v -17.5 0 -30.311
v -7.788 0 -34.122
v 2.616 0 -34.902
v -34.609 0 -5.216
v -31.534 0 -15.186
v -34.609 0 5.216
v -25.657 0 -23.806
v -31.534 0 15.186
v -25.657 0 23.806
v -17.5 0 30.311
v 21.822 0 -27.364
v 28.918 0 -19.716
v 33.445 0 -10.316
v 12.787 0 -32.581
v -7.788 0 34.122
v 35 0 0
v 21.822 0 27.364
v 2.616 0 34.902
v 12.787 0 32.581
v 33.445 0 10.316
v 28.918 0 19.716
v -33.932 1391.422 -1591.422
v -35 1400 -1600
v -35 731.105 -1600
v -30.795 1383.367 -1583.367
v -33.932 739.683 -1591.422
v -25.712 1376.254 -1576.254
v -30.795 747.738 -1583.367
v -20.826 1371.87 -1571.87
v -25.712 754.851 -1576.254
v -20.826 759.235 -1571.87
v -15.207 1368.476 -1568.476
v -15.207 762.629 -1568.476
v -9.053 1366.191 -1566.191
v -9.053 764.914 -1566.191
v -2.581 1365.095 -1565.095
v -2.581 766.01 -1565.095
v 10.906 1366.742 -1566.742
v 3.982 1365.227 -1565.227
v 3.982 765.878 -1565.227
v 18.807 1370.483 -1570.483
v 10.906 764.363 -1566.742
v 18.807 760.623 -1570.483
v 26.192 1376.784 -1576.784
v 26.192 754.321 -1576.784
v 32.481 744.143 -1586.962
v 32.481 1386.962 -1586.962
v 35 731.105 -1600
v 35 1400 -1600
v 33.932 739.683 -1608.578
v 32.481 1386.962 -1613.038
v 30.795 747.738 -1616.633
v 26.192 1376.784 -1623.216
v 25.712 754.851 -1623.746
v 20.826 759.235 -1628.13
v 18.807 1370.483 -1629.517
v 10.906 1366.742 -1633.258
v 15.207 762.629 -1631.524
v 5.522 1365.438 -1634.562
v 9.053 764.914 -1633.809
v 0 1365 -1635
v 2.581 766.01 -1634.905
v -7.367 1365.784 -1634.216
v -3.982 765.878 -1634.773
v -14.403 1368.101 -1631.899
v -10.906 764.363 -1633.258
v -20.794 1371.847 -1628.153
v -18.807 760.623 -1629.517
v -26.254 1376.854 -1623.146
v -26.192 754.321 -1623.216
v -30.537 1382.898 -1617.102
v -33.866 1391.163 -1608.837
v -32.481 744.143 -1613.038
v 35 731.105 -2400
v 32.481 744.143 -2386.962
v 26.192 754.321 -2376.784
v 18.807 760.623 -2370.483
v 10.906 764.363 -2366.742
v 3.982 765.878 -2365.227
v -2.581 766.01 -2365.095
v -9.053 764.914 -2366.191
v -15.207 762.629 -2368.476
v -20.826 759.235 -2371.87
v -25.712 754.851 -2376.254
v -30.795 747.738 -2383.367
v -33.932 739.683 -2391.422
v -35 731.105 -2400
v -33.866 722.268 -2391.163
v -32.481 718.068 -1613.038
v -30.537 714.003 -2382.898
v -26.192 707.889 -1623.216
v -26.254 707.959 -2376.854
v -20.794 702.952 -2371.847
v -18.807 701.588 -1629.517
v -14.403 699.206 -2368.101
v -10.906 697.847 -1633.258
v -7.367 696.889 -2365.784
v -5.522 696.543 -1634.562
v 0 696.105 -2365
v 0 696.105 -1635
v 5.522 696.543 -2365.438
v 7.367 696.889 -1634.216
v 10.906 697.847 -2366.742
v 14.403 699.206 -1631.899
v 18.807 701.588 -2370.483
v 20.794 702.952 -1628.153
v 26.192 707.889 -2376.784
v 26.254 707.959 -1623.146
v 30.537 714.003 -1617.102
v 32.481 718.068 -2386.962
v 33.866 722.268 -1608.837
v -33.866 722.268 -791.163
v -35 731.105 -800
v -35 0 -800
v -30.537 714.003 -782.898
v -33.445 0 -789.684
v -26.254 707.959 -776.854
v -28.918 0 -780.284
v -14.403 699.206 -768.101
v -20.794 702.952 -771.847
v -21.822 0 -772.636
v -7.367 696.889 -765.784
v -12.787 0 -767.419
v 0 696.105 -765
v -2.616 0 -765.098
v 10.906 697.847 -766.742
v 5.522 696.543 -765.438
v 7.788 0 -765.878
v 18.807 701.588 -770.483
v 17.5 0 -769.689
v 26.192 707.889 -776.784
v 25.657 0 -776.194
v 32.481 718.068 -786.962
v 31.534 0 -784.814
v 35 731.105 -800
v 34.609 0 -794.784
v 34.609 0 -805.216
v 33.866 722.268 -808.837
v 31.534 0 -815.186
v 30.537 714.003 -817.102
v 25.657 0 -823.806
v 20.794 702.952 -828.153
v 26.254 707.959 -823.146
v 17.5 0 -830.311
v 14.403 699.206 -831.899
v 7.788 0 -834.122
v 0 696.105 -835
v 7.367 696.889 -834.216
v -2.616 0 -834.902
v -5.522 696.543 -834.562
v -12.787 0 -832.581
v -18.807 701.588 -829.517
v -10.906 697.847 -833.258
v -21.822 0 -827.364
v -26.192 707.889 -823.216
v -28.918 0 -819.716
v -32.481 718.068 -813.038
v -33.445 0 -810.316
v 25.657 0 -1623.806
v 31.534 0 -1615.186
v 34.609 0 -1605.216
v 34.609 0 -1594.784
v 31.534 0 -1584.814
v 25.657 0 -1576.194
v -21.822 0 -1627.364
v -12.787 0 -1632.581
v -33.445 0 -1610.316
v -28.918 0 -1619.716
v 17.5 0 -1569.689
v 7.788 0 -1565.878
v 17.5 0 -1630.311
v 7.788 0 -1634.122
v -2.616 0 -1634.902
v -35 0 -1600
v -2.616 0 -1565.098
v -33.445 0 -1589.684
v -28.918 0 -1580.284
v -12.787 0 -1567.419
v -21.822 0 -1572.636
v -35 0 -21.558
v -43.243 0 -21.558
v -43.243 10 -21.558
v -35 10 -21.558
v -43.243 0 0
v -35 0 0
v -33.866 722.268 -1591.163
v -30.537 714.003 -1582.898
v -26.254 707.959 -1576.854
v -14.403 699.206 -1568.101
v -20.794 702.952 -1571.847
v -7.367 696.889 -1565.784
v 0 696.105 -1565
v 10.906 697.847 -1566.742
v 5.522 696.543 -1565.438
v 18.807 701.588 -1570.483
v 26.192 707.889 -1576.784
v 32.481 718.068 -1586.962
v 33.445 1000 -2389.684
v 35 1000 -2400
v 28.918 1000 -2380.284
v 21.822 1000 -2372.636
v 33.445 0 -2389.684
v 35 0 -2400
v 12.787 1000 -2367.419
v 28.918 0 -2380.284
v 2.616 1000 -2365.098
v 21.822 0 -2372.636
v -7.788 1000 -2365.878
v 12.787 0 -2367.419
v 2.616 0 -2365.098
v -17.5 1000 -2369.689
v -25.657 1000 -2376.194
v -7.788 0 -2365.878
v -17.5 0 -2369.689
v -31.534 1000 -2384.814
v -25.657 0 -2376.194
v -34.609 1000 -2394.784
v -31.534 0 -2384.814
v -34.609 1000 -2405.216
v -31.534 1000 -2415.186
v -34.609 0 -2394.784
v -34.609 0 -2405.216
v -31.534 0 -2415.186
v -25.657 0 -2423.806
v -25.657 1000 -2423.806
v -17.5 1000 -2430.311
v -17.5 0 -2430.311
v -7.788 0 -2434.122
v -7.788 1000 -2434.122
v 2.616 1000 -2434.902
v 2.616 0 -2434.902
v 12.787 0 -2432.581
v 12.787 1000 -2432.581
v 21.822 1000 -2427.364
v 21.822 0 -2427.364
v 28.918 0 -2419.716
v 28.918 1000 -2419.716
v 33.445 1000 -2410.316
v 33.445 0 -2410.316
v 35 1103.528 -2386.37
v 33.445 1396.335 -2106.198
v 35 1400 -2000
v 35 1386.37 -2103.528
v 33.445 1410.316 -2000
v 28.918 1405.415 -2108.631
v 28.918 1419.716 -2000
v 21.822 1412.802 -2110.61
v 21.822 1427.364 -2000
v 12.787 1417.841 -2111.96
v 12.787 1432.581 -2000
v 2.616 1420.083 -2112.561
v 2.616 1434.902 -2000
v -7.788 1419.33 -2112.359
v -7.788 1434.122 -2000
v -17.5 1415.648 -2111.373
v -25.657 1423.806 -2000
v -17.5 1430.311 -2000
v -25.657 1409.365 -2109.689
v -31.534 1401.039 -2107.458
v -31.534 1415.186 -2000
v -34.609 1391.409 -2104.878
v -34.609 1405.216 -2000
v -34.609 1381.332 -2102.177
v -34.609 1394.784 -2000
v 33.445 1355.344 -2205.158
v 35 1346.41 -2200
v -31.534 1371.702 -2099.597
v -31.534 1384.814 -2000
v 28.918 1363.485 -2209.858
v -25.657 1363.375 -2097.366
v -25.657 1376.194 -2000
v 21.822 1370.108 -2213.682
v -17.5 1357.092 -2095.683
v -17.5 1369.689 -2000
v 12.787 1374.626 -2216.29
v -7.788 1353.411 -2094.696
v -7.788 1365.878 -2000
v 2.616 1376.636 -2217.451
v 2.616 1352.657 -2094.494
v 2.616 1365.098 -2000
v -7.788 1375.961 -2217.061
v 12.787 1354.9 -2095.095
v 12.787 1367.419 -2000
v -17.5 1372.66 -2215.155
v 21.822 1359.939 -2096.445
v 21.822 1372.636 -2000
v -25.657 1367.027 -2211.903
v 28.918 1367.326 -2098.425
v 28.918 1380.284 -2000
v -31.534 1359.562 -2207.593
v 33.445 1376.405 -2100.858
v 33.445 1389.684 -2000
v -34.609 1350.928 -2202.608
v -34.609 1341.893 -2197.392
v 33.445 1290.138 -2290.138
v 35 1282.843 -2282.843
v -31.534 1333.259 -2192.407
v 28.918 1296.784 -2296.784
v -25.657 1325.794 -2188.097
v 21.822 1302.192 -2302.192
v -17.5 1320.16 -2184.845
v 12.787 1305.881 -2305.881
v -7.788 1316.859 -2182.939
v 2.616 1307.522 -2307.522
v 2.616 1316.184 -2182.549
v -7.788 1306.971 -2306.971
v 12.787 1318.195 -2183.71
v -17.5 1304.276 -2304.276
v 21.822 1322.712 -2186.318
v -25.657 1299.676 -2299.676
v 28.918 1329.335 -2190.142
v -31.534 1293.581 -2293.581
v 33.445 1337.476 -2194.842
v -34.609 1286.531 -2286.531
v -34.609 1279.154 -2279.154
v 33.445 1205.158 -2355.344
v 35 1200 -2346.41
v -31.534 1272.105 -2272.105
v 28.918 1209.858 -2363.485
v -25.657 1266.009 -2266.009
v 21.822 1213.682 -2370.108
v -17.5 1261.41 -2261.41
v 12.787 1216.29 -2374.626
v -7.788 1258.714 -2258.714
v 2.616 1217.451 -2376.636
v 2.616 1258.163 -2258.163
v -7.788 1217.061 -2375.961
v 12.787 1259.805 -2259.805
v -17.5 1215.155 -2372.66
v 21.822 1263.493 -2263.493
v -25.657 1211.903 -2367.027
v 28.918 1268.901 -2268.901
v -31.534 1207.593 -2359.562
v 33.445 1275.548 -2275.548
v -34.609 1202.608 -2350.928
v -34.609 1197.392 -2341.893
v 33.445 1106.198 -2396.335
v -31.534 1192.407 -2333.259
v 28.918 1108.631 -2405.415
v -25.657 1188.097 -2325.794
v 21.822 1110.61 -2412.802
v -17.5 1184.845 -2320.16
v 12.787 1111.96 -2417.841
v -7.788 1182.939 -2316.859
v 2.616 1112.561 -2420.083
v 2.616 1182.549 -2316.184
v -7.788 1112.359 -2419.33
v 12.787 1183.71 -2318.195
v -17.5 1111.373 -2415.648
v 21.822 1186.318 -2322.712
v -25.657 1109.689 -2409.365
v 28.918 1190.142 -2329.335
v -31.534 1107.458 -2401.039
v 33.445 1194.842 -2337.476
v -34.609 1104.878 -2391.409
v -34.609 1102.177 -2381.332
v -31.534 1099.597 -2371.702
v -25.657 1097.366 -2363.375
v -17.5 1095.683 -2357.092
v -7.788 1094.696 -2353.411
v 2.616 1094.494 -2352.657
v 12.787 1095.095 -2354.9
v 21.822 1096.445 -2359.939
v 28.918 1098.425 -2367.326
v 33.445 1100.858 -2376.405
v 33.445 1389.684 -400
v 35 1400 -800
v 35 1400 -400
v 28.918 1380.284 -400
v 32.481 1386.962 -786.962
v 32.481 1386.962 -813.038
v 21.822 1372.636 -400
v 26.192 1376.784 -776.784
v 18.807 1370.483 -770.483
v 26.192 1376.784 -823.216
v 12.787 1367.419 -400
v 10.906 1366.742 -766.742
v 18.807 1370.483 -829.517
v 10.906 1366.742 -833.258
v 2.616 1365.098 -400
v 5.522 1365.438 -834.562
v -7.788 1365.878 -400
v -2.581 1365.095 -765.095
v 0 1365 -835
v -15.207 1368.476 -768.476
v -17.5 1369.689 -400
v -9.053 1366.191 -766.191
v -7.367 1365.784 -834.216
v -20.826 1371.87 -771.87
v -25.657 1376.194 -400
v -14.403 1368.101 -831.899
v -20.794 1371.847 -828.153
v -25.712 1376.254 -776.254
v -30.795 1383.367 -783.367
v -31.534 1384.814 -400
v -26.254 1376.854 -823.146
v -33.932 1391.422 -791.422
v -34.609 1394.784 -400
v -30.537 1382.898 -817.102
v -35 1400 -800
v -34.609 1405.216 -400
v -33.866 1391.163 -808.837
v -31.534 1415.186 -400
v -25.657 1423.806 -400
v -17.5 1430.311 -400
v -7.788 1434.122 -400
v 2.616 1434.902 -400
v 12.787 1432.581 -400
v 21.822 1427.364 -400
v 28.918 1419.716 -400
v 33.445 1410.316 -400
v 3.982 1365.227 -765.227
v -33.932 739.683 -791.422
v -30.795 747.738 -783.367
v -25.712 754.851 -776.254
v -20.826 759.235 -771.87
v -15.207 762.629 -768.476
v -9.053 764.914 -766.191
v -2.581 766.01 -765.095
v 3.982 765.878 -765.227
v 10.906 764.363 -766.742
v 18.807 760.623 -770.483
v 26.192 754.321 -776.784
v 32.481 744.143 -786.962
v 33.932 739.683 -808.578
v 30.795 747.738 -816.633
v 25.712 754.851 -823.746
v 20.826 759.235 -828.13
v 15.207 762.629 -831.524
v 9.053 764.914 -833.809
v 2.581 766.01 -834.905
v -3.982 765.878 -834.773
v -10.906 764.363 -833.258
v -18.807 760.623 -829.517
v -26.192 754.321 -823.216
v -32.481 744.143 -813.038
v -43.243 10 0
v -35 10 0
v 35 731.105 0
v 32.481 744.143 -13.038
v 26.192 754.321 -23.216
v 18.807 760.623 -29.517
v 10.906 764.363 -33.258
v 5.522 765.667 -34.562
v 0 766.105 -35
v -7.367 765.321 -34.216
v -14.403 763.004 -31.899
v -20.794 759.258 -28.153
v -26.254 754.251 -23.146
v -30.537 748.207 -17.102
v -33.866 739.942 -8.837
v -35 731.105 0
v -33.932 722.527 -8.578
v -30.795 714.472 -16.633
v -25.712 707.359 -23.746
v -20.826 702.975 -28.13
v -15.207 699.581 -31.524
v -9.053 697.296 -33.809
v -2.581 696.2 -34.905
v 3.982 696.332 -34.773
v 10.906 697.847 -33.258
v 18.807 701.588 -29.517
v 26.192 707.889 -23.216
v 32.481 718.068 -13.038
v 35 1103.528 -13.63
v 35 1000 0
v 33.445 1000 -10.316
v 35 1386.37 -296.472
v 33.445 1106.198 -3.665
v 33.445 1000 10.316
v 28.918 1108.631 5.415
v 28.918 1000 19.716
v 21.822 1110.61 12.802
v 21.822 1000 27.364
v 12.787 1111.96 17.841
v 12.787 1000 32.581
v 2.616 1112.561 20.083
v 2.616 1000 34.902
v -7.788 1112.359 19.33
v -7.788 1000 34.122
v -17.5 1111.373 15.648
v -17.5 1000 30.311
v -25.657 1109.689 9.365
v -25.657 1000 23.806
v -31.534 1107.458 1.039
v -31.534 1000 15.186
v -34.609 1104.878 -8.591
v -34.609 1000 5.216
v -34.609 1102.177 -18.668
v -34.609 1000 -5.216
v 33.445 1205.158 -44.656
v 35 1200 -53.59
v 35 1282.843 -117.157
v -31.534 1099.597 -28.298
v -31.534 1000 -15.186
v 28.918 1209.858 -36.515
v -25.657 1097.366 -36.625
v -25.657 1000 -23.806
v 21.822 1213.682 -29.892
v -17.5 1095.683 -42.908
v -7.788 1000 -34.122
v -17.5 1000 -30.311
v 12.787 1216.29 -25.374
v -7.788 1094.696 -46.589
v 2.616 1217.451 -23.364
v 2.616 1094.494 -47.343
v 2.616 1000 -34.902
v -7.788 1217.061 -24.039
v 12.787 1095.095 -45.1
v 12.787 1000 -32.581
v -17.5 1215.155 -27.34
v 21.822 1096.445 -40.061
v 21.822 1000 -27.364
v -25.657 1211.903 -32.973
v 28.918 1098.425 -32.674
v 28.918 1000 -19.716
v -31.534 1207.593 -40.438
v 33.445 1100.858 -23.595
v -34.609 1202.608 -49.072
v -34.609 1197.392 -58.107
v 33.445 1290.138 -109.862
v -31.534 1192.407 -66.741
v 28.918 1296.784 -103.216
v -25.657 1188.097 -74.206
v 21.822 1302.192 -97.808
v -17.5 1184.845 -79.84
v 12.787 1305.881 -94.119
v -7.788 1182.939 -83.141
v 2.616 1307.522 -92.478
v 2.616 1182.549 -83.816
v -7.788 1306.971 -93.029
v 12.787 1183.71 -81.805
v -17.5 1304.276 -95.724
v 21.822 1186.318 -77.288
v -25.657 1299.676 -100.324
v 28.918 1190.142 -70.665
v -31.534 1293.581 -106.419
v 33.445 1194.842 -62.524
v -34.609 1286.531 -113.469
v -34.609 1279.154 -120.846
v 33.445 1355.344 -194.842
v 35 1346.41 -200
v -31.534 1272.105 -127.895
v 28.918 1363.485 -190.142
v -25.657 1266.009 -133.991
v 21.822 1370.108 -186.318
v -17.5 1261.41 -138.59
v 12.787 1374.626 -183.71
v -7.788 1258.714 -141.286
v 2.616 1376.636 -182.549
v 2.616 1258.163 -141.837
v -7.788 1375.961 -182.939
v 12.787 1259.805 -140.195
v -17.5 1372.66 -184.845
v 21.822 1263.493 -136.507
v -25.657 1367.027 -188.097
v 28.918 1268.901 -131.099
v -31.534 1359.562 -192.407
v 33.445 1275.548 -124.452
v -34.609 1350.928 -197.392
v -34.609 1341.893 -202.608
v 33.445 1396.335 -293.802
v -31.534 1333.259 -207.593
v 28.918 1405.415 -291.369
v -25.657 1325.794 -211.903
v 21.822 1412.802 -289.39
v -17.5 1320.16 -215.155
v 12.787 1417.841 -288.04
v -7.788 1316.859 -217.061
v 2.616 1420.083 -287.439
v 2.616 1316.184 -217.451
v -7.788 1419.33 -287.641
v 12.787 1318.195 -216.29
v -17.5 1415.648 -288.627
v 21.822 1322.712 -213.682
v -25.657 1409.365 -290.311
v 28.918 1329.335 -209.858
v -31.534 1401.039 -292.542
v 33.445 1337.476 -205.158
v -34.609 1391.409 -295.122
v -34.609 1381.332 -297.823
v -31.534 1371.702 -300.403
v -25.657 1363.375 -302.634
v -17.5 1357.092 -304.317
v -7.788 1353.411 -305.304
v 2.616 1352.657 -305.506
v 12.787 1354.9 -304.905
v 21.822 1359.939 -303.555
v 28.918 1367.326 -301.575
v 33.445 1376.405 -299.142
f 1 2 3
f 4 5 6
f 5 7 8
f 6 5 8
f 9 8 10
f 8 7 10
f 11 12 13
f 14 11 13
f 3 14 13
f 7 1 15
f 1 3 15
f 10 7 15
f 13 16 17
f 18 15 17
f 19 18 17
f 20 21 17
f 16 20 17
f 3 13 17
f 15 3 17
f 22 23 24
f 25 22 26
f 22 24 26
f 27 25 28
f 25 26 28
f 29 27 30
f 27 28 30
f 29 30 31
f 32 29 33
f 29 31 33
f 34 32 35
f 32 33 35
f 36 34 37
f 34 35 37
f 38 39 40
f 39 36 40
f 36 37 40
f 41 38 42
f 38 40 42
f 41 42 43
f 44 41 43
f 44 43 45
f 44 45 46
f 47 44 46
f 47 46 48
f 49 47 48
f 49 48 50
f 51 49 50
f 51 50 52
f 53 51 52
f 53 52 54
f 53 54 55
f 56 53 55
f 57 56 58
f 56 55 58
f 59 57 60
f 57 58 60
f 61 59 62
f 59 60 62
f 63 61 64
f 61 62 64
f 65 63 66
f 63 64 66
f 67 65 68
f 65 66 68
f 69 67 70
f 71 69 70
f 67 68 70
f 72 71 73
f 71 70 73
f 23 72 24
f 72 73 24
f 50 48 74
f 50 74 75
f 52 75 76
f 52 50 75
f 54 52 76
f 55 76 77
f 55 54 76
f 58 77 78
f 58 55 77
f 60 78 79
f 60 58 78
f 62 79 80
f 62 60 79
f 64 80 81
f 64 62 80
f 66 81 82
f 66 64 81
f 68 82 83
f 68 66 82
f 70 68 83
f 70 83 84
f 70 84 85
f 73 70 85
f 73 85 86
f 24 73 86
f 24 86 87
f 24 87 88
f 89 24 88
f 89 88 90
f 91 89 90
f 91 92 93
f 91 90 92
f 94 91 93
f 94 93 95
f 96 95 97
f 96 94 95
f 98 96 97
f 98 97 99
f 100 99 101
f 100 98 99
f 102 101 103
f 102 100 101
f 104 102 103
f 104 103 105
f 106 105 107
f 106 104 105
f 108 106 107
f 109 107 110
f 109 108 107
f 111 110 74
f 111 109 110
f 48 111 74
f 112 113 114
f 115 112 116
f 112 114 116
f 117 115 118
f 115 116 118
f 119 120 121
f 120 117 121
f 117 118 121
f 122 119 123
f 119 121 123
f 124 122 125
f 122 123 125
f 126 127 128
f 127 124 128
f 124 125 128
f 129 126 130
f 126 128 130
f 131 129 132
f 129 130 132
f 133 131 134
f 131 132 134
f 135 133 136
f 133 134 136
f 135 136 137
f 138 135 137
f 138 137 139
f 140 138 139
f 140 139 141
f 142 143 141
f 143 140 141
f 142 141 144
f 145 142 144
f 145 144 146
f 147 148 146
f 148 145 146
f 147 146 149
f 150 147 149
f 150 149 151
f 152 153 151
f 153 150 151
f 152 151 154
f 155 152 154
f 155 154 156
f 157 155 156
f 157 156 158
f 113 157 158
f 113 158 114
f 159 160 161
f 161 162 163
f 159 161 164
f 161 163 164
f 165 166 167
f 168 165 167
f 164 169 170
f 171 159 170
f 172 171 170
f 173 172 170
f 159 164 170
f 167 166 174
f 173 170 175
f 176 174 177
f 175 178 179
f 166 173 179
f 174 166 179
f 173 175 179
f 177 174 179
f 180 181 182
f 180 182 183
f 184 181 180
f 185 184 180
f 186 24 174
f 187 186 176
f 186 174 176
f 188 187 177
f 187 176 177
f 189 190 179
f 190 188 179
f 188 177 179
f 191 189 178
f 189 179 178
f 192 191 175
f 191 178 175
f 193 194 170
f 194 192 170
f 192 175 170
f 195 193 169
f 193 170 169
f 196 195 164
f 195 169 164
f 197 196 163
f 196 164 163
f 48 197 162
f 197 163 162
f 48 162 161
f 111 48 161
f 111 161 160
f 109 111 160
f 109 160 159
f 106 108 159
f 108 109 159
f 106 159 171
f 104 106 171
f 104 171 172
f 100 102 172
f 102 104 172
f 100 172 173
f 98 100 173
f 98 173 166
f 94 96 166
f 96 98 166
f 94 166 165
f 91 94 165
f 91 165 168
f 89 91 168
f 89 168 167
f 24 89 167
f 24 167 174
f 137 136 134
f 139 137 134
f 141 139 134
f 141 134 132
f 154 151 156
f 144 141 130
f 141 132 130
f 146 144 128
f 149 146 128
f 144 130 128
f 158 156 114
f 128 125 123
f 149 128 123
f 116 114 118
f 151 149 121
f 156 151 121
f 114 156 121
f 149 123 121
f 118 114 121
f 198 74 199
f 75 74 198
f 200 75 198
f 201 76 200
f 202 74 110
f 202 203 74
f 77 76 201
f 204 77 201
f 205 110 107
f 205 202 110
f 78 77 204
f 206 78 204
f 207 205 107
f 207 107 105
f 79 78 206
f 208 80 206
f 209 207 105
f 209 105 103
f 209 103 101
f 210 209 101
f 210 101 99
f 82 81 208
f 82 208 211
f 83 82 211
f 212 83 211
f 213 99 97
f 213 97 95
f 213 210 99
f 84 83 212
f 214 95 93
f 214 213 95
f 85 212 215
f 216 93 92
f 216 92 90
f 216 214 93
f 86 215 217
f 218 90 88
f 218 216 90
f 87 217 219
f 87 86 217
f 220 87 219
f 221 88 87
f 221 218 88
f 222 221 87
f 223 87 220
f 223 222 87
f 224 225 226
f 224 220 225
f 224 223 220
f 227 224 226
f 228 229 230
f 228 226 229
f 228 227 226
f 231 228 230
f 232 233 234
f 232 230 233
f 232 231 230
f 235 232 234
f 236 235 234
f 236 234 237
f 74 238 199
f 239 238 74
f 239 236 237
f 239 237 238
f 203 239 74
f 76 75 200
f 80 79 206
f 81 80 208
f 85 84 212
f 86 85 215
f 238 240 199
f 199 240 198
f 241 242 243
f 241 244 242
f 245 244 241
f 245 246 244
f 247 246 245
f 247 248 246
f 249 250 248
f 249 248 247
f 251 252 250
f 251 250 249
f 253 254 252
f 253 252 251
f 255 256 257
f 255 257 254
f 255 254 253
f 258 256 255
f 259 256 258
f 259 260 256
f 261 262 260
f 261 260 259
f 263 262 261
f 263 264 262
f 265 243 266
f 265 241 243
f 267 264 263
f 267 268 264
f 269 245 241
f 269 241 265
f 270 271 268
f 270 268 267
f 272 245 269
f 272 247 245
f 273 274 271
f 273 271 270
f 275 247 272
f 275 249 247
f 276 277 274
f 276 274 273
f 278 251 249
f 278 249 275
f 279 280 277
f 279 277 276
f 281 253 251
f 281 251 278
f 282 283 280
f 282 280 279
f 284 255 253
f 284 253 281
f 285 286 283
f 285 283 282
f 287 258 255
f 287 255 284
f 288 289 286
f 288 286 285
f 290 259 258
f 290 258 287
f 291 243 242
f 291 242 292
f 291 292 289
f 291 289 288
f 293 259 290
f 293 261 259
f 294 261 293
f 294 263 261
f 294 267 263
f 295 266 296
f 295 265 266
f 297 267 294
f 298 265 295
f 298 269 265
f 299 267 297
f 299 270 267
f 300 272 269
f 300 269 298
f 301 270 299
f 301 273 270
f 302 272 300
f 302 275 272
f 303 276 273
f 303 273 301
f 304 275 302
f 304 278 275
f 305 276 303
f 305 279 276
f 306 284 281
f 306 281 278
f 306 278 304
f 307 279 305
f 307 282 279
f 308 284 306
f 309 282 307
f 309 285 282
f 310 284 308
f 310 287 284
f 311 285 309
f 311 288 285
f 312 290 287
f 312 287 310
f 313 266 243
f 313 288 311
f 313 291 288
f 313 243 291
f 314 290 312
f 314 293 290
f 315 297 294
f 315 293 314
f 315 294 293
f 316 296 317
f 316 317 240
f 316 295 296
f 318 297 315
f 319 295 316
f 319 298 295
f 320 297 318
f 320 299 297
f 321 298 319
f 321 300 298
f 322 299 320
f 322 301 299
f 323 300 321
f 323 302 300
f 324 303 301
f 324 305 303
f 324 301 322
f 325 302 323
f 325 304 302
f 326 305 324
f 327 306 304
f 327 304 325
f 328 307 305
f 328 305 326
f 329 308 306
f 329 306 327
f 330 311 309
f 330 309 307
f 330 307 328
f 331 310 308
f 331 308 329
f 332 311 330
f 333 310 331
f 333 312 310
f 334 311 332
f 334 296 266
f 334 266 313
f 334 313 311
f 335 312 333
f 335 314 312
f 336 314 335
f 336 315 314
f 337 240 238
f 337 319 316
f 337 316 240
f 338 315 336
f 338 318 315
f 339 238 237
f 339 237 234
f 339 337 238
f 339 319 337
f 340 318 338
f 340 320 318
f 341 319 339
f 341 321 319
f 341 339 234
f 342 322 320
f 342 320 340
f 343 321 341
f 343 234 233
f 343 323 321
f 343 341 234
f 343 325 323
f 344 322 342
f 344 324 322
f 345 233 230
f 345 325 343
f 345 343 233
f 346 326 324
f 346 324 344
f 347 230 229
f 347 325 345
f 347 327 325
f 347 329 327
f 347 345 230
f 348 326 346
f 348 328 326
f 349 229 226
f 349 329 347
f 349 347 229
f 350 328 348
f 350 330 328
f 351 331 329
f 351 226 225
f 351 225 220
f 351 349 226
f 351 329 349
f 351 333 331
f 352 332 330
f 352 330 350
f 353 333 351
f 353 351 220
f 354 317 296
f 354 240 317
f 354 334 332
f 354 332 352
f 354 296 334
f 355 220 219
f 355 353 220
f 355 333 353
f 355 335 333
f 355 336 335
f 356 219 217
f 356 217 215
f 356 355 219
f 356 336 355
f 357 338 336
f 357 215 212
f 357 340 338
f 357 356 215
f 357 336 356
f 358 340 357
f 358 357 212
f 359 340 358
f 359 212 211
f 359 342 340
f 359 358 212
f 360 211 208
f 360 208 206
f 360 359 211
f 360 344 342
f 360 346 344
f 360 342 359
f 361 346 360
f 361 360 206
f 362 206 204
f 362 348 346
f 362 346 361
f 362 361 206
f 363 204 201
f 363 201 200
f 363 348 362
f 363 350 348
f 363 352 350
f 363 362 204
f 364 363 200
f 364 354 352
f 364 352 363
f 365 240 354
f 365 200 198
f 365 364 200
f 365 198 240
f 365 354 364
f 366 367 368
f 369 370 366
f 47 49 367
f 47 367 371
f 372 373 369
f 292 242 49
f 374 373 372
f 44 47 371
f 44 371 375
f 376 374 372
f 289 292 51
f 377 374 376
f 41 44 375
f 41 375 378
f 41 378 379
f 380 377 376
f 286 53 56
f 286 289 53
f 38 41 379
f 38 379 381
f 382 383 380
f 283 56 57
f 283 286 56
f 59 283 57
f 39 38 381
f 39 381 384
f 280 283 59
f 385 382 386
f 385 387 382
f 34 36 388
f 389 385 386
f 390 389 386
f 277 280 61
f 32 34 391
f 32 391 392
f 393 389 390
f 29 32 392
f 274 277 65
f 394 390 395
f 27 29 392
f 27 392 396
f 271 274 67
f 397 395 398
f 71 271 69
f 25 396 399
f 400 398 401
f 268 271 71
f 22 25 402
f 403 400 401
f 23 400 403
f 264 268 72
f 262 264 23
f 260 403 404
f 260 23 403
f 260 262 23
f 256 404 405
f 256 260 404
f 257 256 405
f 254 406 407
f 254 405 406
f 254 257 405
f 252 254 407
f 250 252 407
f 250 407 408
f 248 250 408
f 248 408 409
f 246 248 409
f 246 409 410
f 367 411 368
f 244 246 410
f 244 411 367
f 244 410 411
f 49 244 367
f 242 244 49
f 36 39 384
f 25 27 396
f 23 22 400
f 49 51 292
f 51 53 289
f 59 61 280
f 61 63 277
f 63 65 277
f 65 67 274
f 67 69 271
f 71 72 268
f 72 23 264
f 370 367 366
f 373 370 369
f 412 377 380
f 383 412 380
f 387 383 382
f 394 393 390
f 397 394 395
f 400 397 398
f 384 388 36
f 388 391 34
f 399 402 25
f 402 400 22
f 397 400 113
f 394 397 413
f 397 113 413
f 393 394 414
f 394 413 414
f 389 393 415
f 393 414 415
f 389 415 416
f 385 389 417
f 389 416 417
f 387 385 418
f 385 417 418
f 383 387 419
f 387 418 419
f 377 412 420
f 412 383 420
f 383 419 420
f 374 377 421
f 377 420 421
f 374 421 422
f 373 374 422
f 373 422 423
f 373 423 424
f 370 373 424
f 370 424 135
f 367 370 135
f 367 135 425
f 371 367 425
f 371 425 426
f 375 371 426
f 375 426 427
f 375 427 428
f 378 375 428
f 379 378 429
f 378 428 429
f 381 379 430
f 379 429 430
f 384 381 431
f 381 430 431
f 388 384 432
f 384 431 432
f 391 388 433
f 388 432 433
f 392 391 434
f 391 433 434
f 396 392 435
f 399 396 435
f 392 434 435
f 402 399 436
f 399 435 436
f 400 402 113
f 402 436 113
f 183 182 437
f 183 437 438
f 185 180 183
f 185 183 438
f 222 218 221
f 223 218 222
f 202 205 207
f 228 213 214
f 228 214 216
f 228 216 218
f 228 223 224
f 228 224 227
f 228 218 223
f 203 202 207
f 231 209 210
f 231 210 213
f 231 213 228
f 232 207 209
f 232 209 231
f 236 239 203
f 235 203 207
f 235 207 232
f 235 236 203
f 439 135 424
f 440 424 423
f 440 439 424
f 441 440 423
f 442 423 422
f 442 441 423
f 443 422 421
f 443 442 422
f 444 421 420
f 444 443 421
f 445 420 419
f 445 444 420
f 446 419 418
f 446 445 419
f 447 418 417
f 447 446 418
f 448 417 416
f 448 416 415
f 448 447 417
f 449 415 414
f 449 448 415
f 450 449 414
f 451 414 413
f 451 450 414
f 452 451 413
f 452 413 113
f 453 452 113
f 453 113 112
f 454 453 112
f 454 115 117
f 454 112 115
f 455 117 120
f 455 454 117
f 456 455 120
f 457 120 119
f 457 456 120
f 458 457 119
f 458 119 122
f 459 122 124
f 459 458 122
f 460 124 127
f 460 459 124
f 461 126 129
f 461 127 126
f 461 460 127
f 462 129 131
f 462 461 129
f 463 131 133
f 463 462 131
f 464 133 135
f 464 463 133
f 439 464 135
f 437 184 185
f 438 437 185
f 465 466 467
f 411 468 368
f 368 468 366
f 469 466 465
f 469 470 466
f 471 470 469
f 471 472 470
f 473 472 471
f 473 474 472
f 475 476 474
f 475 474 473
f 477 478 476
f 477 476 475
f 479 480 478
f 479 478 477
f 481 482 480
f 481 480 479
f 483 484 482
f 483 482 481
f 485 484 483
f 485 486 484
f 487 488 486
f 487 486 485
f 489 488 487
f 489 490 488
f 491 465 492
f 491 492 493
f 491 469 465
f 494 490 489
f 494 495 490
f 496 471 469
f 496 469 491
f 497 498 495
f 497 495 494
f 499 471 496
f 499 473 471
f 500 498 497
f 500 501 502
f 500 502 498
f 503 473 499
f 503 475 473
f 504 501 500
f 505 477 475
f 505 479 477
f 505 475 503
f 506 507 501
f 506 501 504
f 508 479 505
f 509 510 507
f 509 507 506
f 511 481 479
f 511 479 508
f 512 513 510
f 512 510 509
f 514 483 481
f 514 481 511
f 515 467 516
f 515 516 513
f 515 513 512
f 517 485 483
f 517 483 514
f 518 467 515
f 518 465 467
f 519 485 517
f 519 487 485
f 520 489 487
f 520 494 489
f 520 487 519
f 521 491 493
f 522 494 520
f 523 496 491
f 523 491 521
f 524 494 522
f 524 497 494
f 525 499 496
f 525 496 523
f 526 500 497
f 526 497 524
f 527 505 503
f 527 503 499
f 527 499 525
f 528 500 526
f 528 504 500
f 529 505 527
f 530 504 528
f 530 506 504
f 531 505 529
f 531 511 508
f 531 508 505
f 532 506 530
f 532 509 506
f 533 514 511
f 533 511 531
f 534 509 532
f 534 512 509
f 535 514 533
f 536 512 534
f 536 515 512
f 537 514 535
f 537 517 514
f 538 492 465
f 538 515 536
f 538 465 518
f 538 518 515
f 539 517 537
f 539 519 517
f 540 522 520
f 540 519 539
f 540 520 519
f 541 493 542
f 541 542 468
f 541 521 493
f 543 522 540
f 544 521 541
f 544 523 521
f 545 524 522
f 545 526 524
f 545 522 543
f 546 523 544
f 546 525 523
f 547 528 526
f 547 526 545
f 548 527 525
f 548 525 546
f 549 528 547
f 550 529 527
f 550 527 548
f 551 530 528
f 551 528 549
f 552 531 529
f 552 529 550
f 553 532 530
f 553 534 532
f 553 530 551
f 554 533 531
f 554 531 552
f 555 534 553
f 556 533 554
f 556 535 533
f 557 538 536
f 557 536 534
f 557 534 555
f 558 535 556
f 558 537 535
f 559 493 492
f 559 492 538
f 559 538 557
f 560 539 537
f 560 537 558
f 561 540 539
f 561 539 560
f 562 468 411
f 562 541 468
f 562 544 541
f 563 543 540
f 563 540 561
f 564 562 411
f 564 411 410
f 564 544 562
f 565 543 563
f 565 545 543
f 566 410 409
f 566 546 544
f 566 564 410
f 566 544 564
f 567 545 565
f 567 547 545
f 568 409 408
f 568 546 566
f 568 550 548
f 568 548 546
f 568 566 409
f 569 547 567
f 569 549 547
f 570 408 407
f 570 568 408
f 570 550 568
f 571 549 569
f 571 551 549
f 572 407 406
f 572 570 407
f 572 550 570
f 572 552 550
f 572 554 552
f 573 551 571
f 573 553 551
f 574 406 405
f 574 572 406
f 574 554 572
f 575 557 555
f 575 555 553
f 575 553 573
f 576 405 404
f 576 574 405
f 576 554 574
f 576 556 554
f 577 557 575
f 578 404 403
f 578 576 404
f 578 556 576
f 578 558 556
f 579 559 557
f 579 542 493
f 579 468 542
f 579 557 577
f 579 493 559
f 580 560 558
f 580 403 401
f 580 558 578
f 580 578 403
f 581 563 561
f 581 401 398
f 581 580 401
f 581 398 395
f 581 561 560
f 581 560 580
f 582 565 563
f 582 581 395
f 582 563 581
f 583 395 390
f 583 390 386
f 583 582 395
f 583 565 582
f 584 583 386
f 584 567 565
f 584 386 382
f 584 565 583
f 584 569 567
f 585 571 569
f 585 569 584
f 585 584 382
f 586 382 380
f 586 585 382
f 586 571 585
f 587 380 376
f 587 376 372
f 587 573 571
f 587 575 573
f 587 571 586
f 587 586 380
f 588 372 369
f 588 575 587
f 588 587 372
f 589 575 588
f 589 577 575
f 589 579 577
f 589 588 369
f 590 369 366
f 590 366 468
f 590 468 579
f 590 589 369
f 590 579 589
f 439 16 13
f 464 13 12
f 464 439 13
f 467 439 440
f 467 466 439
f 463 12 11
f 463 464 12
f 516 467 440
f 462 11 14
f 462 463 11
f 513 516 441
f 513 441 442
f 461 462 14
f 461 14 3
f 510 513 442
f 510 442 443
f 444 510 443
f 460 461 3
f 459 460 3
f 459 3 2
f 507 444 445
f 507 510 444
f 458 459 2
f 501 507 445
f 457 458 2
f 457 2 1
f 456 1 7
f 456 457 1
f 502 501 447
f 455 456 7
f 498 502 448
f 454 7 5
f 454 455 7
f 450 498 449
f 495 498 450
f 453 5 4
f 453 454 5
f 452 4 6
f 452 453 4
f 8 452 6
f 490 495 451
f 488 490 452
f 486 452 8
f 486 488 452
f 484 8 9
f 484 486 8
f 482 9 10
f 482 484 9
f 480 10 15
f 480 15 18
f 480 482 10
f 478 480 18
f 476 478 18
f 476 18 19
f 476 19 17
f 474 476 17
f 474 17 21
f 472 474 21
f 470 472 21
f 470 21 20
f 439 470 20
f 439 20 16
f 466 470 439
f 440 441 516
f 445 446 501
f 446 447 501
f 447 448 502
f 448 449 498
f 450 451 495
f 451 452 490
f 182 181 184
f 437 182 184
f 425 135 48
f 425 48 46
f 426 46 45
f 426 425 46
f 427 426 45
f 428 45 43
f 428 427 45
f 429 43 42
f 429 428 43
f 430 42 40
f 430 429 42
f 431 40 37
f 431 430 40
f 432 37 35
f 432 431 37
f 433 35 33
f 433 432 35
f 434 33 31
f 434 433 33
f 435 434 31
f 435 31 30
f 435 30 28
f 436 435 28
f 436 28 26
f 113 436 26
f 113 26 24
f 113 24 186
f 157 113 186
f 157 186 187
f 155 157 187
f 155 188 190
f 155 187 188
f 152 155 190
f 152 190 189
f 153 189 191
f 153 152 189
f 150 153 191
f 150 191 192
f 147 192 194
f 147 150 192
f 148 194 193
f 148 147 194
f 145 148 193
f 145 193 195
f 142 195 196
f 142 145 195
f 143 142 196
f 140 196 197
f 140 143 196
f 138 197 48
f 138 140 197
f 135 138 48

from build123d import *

# Parameters (mm, degrees)
SKETCH_2_R      = 35
SKETCH_3_R      = 35
EXTRUDE_1_DEPTH = 1400
SKETCH_4_R      = 35
EXTRUDE_2_DEPTH = 2400
SKETCH_5_W      = 8.243400837
SKETCH_5_H      = 21.558129969
EXTRUDE_3_DEPTH = 10


with BuildPart() as part:
    # 扫描1: sweep along a path in 草图1
    with BuildLine(Plane(origin=(0, 0, 0), x_dir=(0, 0, -1), z_dir=(1, 0, 0))) as sweep_1_path:
        Line((0, 0), (0, 1000))
        ThreePointArc((0, 1000), (117.157287525, 1282.842712475), (400, 1400))
        Line((400, 1400), (2000, 1400))
        ThreePointArc((2000, 1400), (2282.842712475, 1282.842712475), (2400, 1000))
        Line((2400, 1000), (2400, 0))
    # 草图2 → 扫描1 (sweep)
    with BuildSketch(Plane(origin=(0, 0, 0), x_dir=(1, 0, 0), z_dir=(0, 1, 0))):
        Circle(SKETCH_2_R)
    sweep(path=sweep_1_path.line)

    # 草图3 → 凸台-拉伸1 (add)
    with BuildSketch(Plane(origin=(0, 0, 0), x_dir=(1, 0, 0), z_dir=(0, 1, 0))):
        with Locations(Location((0, 1600, 0), (0, 0, 180))):
            Circle(SKETCH_3_R)
        with Locations(Location((0, 800, 0), (0, 0, 180))):
            Circle(SKETCH_3_R)
    extrude(amount=EXTRUDE_1_DEPTH)

    # 草图4 → 凸台-拉伸2 (add)
    with BuildSketch(Plane.XY):
        with Locations((0, 731.105097609)):
            Circle(SKETCH_4_R)
    extrude(amount=-EXTRUDE_2_DEPTH)


with BuildPart() as body_2:
    # 草图5 → 凸台-拉伸3 (new body)
    with BuildSketch(Plane.XZ):
        with Locations((-39.121700418, -10.779064985)):
            Rectangle(SKETCH_5_W, SKETCH_5_H)
    extrude(amount=-EXTRUDE_3_DEPTH)


solid = Compound([part.part, body_2.part])
